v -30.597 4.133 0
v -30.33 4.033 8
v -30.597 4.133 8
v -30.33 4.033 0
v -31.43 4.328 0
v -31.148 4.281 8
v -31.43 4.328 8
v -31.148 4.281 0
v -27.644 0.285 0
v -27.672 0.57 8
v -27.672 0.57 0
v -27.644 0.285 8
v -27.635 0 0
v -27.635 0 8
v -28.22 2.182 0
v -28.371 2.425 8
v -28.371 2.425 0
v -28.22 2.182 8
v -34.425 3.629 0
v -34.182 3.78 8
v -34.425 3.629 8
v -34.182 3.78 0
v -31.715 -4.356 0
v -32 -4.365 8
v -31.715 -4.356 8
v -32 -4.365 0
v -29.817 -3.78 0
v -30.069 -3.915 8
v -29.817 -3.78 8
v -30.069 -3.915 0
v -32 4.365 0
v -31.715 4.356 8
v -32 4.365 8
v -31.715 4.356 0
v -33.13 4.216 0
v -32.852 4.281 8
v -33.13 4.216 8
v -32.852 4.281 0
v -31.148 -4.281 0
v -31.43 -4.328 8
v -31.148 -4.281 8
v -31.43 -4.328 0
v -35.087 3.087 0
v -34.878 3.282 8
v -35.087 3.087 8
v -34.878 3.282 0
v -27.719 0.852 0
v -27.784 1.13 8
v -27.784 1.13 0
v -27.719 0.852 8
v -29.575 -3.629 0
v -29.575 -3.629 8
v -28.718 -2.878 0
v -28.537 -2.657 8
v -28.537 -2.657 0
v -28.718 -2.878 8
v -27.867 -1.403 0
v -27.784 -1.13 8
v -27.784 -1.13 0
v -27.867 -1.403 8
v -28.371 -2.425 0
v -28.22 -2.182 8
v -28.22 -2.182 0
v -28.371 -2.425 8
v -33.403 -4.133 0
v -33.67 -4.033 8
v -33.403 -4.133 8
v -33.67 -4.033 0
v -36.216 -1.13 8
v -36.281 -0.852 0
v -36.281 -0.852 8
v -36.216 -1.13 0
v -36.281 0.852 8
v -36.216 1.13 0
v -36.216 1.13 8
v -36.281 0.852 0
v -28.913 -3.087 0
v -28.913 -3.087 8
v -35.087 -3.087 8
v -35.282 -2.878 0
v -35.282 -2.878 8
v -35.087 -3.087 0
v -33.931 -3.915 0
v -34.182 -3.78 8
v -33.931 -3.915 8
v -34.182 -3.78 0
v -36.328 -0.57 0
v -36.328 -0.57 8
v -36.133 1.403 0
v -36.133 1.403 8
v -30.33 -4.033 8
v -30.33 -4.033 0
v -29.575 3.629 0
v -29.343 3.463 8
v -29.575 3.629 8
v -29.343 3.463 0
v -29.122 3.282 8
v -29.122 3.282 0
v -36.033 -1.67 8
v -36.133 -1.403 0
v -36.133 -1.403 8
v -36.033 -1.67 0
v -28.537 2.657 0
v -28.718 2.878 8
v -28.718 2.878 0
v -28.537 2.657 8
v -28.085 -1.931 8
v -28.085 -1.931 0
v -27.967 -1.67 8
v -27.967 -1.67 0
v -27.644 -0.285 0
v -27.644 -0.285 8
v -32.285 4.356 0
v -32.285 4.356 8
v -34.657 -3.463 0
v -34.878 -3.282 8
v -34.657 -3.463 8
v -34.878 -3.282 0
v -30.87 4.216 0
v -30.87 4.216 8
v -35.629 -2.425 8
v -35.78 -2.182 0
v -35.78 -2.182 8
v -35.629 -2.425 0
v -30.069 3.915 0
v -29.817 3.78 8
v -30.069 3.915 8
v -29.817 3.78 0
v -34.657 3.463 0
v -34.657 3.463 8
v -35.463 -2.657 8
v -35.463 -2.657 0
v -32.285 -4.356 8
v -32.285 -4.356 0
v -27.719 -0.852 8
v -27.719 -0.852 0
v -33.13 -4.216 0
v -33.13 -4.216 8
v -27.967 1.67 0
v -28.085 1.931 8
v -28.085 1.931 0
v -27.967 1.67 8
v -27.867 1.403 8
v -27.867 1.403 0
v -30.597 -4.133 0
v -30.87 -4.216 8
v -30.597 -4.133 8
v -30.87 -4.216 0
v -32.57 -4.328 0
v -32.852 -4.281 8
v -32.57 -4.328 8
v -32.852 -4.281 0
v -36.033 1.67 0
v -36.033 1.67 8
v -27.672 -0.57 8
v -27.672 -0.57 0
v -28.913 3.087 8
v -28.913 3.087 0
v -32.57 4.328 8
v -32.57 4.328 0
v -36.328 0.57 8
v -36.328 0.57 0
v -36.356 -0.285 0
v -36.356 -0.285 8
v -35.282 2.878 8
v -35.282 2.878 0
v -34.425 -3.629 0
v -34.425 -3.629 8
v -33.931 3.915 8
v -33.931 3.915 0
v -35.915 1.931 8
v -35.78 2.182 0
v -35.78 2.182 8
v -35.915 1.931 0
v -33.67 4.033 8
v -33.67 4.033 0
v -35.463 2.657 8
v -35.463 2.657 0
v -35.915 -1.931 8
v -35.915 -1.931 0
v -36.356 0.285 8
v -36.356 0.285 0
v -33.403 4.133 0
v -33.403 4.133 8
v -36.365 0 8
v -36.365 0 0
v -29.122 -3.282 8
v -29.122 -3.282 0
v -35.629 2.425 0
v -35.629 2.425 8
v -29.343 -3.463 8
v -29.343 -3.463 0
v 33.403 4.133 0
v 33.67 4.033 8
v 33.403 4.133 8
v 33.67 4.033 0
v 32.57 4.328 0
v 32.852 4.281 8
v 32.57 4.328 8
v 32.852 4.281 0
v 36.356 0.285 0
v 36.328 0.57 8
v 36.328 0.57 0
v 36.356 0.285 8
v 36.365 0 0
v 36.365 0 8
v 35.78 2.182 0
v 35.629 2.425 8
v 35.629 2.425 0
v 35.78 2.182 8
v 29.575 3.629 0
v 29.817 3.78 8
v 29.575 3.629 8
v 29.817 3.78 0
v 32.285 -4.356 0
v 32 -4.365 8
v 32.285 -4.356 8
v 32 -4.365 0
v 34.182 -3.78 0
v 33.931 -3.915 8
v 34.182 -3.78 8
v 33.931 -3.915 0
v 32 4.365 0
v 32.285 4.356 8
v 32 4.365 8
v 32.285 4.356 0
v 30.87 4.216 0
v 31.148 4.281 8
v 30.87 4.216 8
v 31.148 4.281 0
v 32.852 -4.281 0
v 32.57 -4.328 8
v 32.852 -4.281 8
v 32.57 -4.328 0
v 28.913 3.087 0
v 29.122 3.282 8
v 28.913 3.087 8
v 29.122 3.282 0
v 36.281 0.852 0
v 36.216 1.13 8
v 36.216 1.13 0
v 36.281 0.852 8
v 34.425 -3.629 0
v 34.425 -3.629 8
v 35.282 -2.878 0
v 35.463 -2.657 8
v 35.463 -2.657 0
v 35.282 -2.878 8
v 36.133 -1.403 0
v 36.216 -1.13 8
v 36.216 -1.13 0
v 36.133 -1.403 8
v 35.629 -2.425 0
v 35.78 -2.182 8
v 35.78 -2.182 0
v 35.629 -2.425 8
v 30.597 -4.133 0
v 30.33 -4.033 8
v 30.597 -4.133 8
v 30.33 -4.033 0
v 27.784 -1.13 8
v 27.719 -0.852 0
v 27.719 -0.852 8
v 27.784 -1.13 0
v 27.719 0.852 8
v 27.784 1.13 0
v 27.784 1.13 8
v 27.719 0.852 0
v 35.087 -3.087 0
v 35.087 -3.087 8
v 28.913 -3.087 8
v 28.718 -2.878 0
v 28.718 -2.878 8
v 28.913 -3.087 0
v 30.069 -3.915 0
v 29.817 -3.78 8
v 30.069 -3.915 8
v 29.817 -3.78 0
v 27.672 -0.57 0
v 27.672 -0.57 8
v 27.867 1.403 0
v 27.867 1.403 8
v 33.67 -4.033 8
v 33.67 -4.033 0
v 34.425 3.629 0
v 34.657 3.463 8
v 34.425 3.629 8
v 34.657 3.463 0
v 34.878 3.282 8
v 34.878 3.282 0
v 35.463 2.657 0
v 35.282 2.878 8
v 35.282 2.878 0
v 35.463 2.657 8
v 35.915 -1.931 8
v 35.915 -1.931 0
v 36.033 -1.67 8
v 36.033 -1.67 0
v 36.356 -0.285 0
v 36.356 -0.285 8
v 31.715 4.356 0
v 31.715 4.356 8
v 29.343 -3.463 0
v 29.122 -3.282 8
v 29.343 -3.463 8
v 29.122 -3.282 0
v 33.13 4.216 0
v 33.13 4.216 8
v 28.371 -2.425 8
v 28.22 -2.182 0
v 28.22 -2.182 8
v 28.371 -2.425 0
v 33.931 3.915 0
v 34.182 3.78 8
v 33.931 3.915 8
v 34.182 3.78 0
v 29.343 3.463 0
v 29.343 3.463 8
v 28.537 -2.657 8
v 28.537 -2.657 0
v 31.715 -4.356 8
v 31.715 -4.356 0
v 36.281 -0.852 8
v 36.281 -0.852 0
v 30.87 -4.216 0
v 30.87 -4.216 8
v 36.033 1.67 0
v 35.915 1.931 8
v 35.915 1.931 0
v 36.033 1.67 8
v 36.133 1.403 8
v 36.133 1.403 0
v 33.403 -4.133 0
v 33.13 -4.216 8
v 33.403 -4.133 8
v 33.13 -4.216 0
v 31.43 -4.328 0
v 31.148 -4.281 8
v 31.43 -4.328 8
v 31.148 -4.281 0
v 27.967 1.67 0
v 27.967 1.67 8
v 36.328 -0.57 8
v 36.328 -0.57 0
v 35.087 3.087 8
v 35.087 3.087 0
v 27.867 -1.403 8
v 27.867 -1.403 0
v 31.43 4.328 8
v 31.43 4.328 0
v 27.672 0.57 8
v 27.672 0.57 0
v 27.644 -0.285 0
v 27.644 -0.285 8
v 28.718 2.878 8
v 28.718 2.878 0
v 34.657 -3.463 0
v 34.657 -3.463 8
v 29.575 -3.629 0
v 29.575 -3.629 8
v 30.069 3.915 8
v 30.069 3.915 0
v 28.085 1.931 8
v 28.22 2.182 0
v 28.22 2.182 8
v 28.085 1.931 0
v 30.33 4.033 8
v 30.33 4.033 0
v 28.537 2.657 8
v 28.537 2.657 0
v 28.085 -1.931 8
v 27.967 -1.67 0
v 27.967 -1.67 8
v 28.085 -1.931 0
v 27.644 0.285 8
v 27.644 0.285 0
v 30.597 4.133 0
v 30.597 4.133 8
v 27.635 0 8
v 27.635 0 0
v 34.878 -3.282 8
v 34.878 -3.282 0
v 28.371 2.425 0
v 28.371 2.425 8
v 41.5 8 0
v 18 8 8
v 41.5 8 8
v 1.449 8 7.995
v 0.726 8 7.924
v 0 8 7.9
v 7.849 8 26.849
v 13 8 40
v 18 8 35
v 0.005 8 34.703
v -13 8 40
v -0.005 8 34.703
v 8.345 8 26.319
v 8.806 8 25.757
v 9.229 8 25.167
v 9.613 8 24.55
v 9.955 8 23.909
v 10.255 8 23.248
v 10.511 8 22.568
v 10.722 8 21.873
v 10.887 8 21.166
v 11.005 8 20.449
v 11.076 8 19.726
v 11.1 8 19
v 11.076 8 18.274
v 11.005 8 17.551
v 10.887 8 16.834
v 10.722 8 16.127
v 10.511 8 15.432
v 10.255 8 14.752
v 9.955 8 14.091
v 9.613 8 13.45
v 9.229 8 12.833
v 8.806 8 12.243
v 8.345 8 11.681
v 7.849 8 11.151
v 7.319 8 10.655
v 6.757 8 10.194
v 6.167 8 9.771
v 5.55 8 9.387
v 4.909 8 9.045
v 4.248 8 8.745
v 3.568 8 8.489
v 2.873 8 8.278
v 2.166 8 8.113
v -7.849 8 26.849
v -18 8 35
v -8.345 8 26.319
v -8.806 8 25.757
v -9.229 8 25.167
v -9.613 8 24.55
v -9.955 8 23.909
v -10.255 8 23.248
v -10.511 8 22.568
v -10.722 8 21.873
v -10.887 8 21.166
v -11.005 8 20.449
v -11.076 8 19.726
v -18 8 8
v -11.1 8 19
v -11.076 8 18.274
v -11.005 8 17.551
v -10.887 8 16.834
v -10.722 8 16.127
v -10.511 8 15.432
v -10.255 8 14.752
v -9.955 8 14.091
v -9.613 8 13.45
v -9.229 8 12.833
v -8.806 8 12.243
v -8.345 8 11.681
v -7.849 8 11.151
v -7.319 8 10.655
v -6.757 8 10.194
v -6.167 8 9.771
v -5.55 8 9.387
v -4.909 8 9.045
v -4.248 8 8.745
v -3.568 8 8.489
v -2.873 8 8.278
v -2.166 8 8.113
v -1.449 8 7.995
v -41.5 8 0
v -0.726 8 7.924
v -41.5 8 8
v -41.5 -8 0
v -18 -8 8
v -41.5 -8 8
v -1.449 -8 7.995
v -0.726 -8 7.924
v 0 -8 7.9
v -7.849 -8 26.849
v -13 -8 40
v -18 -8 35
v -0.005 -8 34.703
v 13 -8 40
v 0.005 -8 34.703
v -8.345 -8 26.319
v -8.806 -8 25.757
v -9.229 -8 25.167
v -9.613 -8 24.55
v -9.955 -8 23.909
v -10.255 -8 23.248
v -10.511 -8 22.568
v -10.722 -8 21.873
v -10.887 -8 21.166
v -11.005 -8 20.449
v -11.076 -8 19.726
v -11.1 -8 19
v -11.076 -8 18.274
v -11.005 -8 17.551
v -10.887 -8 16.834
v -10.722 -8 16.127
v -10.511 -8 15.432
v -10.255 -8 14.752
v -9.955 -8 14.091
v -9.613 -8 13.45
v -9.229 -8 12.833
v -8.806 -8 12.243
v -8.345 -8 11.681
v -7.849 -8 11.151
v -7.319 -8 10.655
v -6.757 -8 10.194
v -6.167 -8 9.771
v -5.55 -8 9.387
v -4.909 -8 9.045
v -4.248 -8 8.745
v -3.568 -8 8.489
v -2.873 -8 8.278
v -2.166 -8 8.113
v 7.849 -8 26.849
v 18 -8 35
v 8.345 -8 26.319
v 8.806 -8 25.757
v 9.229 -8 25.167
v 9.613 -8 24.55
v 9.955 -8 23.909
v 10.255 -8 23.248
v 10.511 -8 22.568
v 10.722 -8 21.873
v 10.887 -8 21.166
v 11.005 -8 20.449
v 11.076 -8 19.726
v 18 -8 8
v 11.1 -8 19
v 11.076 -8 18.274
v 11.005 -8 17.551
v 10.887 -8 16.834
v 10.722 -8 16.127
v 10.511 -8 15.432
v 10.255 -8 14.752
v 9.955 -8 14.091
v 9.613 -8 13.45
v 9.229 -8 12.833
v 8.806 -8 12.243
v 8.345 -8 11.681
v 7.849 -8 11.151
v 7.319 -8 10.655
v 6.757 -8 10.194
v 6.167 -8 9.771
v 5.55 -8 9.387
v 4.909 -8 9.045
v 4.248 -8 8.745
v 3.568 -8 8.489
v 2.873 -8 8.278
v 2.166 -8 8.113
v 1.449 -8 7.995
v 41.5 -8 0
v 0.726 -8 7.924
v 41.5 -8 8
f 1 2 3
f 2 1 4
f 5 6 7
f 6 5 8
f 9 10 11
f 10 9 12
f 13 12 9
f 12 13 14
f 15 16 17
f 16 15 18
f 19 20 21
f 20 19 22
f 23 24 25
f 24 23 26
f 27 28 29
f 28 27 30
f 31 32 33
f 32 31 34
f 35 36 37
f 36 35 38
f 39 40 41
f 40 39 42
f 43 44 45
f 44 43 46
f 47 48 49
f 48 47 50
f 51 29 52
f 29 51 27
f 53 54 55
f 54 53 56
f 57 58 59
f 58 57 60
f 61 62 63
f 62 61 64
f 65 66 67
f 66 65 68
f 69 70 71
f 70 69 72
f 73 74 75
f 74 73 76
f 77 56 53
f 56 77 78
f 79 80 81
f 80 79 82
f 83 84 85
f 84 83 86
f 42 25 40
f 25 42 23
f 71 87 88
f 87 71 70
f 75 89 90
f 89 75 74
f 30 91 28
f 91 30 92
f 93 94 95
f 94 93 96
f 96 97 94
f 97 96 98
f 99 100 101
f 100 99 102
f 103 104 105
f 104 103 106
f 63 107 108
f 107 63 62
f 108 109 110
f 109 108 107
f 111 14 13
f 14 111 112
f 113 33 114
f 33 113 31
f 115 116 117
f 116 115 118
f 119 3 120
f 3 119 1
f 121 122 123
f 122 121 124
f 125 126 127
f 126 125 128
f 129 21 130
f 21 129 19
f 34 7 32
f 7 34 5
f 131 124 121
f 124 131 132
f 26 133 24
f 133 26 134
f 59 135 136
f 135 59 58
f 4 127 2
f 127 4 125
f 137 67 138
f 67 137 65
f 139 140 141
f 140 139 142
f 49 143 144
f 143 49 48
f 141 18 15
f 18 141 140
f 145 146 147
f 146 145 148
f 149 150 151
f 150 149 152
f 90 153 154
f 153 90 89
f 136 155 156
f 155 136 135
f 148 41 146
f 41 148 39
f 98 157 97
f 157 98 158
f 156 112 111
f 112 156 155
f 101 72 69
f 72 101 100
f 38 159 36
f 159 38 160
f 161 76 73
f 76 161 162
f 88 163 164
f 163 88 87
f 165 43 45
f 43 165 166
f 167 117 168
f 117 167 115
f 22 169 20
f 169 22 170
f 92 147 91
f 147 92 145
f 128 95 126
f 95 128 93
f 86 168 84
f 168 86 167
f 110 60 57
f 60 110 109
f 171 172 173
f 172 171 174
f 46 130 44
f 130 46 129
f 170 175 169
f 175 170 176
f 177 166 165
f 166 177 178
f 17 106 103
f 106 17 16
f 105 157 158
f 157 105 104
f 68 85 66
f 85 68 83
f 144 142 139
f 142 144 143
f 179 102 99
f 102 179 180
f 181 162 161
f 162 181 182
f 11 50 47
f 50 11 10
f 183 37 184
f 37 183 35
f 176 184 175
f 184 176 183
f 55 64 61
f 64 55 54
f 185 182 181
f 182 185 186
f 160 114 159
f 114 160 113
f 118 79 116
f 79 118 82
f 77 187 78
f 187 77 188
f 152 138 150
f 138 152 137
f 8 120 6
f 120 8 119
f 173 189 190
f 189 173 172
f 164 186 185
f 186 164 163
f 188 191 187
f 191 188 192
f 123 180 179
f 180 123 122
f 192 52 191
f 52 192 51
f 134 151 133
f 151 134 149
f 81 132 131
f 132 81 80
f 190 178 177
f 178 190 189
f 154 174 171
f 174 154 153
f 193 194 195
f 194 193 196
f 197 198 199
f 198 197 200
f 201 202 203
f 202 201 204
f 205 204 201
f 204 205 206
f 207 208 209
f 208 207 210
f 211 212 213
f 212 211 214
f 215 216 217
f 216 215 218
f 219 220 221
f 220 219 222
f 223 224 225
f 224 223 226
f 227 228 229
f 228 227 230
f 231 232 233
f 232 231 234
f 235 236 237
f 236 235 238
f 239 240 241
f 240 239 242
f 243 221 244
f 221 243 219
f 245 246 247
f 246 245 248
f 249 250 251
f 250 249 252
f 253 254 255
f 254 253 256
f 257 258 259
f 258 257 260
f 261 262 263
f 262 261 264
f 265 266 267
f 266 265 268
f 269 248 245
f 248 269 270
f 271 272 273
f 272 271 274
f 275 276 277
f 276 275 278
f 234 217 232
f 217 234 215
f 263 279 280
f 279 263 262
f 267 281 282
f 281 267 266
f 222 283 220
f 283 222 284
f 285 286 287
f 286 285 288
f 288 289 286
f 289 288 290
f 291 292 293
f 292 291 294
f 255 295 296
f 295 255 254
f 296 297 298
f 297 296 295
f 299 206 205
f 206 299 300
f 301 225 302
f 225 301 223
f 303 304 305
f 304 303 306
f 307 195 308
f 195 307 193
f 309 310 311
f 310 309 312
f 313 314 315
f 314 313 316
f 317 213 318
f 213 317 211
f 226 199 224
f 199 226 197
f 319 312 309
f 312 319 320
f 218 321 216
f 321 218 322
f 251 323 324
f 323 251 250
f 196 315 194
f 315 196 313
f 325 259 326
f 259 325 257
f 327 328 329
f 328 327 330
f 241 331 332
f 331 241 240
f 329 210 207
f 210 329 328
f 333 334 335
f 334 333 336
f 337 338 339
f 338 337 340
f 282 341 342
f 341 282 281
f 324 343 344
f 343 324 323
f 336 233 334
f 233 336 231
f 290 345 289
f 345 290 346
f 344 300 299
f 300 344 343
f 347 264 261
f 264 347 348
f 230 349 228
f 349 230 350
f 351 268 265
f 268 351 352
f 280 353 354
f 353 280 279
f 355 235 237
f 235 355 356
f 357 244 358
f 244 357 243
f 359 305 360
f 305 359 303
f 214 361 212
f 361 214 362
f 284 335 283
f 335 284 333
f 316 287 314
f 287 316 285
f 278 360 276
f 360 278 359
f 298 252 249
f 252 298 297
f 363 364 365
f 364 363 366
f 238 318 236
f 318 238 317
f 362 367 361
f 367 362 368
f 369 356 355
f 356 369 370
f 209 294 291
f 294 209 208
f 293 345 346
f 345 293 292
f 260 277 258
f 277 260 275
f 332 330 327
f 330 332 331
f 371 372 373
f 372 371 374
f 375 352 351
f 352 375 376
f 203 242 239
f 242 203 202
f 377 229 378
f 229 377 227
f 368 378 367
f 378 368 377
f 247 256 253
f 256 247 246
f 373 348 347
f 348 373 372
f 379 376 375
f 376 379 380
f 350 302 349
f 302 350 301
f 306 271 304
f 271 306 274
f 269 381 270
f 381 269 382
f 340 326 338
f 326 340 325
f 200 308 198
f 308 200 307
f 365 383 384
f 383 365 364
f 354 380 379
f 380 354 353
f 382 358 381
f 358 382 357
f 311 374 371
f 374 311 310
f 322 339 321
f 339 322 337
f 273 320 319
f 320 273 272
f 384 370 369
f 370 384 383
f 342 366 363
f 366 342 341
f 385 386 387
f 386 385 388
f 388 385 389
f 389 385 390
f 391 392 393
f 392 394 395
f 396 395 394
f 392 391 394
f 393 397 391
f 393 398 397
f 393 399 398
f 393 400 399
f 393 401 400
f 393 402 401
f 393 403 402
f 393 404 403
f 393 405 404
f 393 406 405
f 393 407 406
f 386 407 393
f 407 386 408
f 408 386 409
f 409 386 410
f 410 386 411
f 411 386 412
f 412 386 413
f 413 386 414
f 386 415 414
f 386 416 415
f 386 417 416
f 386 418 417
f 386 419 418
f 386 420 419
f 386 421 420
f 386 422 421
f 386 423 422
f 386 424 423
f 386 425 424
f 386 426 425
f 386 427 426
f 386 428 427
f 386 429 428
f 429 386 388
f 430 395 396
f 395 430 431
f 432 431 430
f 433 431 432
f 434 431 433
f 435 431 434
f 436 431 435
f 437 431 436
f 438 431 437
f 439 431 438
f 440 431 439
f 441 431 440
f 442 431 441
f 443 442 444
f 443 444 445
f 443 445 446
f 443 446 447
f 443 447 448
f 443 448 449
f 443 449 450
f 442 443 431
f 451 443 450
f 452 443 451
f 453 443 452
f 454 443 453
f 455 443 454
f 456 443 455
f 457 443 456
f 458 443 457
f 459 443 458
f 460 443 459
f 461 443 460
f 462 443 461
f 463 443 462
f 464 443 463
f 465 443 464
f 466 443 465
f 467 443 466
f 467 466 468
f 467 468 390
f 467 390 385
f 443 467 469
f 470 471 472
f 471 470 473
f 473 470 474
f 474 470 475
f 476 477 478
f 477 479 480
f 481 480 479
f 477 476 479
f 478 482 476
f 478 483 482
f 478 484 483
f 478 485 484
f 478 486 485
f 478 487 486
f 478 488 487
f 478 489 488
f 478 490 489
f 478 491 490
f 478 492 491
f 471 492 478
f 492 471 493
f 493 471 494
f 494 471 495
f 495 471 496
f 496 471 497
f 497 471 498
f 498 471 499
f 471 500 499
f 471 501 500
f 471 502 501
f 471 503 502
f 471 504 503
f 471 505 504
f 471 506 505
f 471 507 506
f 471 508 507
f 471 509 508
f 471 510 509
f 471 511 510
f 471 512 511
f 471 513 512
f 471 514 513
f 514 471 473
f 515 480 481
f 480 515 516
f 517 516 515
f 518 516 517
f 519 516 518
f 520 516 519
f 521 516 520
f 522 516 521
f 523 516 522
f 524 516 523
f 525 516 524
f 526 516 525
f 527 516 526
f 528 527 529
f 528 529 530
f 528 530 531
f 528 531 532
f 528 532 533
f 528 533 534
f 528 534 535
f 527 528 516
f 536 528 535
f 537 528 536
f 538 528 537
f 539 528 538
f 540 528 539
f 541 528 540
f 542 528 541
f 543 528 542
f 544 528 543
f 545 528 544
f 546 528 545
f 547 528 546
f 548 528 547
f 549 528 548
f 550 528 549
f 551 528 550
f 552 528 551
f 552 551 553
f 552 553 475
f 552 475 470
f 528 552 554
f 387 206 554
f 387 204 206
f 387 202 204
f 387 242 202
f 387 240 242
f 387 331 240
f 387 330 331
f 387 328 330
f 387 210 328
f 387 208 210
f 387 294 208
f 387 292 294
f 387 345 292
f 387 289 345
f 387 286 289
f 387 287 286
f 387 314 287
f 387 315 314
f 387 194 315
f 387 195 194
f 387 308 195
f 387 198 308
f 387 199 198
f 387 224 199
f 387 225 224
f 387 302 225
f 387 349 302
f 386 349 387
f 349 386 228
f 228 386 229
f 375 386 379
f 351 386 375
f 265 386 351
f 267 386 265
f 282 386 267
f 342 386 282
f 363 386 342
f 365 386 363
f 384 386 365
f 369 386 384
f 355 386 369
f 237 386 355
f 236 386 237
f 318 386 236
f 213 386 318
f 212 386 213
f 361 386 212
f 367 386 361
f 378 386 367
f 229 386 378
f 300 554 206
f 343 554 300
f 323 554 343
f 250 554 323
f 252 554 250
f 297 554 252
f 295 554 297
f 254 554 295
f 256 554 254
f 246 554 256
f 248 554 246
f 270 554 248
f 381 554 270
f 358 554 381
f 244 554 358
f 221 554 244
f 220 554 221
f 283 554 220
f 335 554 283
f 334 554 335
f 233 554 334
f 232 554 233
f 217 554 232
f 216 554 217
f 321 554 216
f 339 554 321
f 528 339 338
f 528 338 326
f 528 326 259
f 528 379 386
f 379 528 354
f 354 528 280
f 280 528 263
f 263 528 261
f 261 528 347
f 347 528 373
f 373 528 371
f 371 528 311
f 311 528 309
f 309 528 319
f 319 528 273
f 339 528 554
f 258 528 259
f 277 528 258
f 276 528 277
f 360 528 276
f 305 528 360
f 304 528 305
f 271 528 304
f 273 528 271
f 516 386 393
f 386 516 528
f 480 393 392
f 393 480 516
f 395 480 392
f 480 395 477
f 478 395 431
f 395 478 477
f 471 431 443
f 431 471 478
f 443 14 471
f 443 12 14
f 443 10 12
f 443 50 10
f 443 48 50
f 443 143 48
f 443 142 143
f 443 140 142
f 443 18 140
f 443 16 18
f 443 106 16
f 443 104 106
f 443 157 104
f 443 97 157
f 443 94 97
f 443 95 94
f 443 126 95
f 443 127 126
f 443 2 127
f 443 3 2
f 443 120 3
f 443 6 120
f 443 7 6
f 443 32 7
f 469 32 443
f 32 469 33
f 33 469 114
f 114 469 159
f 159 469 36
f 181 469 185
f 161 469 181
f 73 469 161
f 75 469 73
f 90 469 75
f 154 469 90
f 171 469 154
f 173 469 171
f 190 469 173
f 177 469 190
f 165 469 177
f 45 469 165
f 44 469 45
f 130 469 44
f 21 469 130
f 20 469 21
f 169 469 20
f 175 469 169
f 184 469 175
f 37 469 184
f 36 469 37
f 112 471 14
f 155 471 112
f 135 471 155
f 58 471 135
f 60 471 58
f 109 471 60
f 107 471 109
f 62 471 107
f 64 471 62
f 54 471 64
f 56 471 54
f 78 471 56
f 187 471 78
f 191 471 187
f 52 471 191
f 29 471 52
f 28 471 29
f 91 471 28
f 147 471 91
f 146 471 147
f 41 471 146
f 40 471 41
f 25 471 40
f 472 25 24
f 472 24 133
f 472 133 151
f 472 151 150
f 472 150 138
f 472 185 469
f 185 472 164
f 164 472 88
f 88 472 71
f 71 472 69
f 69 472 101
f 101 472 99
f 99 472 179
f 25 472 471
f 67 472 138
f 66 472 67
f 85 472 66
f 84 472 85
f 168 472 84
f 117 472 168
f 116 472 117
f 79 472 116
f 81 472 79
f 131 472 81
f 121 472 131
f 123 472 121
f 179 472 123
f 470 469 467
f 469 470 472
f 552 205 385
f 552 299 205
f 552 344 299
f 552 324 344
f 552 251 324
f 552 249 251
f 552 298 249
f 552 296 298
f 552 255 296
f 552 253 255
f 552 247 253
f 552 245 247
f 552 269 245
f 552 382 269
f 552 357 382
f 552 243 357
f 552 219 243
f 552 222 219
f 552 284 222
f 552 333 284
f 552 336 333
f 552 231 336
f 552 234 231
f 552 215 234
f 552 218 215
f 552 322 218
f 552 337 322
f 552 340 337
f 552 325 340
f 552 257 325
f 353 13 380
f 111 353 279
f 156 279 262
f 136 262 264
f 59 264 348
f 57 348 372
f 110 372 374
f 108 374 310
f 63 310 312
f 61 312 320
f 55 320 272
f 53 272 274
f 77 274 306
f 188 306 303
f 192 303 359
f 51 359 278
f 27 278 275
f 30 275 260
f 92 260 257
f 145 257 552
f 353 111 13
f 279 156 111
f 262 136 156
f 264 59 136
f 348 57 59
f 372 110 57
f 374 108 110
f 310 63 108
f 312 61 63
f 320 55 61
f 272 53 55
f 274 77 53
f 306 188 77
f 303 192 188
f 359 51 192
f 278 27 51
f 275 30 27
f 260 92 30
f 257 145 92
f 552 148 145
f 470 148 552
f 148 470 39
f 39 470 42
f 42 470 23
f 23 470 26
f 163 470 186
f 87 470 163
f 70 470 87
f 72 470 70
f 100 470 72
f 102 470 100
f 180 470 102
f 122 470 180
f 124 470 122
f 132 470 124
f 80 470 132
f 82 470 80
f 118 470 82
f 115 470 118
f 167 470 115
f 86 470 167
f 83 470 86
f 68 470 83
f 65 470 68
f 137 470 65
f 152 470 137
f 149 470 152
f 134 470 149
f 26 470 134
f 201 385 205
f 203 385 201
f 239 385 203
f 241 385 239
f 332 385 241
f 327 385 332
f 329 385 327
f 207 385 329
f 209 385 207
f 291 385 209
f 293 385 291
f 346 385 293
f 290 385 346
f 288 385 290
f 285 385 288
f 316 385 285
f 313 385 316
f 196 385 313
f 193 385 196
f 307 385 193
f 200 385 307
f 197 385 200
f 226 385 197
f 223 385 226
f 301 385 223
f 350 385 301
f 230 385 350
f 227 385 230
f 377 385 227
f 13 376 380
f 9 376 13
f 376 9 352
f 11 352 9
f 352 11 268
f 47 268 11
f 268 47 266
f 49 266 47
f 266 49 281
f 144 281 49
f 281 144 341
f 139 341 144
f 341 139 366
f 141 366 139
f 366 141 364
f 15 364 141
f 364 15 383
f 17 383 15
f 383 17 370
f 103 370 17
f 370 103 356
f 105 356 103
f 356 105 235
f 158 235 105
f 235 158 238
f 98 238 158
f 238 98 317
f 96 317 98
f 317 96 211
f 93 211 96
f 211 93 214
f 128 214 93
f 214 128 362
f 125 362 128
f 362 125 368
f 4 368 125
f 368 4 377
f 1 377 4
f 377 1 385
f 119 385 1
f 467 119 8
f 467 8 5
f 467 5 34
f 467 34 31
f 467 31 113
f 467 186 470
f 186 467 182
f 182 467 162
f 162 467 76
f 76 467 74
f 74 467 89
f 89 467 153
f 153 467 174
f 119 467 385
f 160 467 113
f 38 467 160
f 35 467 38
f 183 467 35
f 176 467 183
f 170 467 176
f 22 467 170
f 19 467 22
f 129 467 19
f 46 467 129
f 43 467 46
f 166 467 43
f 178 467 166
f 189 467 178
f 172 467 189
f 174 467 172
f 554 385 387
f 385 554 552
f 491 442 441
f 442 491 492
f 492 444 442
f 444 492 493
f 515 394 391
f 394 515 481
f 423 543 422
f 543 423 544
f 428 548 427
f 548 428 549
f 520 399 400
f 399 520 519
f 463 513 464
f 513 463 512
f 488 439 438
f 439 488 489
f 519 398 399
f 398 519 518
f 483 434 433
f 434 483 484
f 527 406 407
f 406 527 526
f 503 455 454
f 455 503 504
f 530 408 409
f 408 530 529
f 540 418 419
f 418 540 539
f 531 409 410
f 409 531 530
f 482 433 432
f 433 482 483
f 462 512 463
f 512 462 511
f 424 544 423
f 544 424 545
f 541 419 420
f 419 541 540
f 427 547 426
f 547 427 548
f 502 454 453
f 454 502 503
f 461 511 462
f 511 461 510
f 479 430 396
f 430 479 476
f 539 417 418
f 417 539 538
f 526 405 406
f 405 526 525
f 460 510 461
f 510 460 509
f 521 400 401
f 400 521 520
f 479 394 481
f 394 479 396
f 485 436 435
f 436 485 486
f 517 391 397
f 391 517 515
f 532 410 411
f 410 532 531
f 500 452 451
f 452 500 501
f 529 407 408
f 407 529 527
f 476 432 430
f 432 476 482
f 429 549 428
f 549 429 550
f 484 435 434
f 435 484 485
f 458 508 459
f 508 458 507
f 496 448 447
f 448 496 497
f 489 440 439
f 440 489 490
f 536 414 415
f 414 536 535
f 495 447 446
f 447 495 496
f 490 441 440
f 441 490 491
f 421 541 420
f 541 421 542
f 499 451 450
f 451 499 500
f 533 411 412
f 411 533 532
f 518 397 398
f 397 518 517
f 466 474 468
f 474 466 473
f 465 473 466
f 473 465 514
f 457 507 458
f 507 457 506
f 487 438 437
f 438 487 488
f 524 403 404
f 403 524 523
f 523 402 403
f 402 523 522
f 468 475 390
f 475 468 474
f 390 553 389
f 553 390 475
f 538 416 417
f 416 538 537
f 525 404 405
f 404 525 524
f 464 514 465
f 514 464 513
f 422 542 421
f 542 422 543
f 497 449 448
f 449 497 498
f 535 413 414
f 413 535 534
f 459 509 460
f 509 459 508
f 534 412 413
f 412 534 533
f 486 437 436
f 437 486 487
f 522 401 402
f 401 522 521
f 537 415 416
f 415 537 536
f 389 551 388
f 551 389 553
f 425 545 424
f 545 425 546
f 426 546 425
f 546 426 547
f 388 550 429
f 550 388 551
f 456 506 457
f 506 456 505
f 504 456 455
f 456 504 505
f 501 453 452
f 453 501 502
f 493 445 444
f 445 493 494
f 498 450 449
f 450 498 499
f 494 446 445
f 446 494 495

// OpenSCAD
// Base-mount bearing housing: a base plate with a tower round the bearing.
// The bore has a teardrop crown (point up) so its top prints without support.
bearing_diameter = 22;
shaft_height = 19;
bolt_spacing = 64;
bolt_hole = 8.73;
length = 83;
depth = 16;
height = 40;
base = 8;
tower = 36;
chamfer = 5;
fit = 0.1;              // bore allowance for a light press fit
$fn = 96;

r = bearing_diameter/2 + fit;

difference() {
    rotate([90, 0, 0]) linear_extrude(depth, center = true)
        union() {
            translate([-length/2, 0]) square([length, base]);
            polygon([[-tower/2, 0], [tower/2, 0], [tower/2, height - chamfer],
                      [tower/2 - chamfer, height], [-tower/2 + chamfer, height],
                      [-tower/2, height - chamfer]]);
        }
    rotate([90, 0, 0]) linear_extrude(depth + 2, center = true)
        hull() {
            translate([0, shaft_height]) circle(r = r);
            translate([0, shaft_height + r*sqrt(2)]) square(0.01, center = true);
        }
    for (x = [-bolt_spacing/2, bolt_spacing/2])
        translate([x, 0, -1]) cylinder(d = bolt_hole, h = base + 2);
}
